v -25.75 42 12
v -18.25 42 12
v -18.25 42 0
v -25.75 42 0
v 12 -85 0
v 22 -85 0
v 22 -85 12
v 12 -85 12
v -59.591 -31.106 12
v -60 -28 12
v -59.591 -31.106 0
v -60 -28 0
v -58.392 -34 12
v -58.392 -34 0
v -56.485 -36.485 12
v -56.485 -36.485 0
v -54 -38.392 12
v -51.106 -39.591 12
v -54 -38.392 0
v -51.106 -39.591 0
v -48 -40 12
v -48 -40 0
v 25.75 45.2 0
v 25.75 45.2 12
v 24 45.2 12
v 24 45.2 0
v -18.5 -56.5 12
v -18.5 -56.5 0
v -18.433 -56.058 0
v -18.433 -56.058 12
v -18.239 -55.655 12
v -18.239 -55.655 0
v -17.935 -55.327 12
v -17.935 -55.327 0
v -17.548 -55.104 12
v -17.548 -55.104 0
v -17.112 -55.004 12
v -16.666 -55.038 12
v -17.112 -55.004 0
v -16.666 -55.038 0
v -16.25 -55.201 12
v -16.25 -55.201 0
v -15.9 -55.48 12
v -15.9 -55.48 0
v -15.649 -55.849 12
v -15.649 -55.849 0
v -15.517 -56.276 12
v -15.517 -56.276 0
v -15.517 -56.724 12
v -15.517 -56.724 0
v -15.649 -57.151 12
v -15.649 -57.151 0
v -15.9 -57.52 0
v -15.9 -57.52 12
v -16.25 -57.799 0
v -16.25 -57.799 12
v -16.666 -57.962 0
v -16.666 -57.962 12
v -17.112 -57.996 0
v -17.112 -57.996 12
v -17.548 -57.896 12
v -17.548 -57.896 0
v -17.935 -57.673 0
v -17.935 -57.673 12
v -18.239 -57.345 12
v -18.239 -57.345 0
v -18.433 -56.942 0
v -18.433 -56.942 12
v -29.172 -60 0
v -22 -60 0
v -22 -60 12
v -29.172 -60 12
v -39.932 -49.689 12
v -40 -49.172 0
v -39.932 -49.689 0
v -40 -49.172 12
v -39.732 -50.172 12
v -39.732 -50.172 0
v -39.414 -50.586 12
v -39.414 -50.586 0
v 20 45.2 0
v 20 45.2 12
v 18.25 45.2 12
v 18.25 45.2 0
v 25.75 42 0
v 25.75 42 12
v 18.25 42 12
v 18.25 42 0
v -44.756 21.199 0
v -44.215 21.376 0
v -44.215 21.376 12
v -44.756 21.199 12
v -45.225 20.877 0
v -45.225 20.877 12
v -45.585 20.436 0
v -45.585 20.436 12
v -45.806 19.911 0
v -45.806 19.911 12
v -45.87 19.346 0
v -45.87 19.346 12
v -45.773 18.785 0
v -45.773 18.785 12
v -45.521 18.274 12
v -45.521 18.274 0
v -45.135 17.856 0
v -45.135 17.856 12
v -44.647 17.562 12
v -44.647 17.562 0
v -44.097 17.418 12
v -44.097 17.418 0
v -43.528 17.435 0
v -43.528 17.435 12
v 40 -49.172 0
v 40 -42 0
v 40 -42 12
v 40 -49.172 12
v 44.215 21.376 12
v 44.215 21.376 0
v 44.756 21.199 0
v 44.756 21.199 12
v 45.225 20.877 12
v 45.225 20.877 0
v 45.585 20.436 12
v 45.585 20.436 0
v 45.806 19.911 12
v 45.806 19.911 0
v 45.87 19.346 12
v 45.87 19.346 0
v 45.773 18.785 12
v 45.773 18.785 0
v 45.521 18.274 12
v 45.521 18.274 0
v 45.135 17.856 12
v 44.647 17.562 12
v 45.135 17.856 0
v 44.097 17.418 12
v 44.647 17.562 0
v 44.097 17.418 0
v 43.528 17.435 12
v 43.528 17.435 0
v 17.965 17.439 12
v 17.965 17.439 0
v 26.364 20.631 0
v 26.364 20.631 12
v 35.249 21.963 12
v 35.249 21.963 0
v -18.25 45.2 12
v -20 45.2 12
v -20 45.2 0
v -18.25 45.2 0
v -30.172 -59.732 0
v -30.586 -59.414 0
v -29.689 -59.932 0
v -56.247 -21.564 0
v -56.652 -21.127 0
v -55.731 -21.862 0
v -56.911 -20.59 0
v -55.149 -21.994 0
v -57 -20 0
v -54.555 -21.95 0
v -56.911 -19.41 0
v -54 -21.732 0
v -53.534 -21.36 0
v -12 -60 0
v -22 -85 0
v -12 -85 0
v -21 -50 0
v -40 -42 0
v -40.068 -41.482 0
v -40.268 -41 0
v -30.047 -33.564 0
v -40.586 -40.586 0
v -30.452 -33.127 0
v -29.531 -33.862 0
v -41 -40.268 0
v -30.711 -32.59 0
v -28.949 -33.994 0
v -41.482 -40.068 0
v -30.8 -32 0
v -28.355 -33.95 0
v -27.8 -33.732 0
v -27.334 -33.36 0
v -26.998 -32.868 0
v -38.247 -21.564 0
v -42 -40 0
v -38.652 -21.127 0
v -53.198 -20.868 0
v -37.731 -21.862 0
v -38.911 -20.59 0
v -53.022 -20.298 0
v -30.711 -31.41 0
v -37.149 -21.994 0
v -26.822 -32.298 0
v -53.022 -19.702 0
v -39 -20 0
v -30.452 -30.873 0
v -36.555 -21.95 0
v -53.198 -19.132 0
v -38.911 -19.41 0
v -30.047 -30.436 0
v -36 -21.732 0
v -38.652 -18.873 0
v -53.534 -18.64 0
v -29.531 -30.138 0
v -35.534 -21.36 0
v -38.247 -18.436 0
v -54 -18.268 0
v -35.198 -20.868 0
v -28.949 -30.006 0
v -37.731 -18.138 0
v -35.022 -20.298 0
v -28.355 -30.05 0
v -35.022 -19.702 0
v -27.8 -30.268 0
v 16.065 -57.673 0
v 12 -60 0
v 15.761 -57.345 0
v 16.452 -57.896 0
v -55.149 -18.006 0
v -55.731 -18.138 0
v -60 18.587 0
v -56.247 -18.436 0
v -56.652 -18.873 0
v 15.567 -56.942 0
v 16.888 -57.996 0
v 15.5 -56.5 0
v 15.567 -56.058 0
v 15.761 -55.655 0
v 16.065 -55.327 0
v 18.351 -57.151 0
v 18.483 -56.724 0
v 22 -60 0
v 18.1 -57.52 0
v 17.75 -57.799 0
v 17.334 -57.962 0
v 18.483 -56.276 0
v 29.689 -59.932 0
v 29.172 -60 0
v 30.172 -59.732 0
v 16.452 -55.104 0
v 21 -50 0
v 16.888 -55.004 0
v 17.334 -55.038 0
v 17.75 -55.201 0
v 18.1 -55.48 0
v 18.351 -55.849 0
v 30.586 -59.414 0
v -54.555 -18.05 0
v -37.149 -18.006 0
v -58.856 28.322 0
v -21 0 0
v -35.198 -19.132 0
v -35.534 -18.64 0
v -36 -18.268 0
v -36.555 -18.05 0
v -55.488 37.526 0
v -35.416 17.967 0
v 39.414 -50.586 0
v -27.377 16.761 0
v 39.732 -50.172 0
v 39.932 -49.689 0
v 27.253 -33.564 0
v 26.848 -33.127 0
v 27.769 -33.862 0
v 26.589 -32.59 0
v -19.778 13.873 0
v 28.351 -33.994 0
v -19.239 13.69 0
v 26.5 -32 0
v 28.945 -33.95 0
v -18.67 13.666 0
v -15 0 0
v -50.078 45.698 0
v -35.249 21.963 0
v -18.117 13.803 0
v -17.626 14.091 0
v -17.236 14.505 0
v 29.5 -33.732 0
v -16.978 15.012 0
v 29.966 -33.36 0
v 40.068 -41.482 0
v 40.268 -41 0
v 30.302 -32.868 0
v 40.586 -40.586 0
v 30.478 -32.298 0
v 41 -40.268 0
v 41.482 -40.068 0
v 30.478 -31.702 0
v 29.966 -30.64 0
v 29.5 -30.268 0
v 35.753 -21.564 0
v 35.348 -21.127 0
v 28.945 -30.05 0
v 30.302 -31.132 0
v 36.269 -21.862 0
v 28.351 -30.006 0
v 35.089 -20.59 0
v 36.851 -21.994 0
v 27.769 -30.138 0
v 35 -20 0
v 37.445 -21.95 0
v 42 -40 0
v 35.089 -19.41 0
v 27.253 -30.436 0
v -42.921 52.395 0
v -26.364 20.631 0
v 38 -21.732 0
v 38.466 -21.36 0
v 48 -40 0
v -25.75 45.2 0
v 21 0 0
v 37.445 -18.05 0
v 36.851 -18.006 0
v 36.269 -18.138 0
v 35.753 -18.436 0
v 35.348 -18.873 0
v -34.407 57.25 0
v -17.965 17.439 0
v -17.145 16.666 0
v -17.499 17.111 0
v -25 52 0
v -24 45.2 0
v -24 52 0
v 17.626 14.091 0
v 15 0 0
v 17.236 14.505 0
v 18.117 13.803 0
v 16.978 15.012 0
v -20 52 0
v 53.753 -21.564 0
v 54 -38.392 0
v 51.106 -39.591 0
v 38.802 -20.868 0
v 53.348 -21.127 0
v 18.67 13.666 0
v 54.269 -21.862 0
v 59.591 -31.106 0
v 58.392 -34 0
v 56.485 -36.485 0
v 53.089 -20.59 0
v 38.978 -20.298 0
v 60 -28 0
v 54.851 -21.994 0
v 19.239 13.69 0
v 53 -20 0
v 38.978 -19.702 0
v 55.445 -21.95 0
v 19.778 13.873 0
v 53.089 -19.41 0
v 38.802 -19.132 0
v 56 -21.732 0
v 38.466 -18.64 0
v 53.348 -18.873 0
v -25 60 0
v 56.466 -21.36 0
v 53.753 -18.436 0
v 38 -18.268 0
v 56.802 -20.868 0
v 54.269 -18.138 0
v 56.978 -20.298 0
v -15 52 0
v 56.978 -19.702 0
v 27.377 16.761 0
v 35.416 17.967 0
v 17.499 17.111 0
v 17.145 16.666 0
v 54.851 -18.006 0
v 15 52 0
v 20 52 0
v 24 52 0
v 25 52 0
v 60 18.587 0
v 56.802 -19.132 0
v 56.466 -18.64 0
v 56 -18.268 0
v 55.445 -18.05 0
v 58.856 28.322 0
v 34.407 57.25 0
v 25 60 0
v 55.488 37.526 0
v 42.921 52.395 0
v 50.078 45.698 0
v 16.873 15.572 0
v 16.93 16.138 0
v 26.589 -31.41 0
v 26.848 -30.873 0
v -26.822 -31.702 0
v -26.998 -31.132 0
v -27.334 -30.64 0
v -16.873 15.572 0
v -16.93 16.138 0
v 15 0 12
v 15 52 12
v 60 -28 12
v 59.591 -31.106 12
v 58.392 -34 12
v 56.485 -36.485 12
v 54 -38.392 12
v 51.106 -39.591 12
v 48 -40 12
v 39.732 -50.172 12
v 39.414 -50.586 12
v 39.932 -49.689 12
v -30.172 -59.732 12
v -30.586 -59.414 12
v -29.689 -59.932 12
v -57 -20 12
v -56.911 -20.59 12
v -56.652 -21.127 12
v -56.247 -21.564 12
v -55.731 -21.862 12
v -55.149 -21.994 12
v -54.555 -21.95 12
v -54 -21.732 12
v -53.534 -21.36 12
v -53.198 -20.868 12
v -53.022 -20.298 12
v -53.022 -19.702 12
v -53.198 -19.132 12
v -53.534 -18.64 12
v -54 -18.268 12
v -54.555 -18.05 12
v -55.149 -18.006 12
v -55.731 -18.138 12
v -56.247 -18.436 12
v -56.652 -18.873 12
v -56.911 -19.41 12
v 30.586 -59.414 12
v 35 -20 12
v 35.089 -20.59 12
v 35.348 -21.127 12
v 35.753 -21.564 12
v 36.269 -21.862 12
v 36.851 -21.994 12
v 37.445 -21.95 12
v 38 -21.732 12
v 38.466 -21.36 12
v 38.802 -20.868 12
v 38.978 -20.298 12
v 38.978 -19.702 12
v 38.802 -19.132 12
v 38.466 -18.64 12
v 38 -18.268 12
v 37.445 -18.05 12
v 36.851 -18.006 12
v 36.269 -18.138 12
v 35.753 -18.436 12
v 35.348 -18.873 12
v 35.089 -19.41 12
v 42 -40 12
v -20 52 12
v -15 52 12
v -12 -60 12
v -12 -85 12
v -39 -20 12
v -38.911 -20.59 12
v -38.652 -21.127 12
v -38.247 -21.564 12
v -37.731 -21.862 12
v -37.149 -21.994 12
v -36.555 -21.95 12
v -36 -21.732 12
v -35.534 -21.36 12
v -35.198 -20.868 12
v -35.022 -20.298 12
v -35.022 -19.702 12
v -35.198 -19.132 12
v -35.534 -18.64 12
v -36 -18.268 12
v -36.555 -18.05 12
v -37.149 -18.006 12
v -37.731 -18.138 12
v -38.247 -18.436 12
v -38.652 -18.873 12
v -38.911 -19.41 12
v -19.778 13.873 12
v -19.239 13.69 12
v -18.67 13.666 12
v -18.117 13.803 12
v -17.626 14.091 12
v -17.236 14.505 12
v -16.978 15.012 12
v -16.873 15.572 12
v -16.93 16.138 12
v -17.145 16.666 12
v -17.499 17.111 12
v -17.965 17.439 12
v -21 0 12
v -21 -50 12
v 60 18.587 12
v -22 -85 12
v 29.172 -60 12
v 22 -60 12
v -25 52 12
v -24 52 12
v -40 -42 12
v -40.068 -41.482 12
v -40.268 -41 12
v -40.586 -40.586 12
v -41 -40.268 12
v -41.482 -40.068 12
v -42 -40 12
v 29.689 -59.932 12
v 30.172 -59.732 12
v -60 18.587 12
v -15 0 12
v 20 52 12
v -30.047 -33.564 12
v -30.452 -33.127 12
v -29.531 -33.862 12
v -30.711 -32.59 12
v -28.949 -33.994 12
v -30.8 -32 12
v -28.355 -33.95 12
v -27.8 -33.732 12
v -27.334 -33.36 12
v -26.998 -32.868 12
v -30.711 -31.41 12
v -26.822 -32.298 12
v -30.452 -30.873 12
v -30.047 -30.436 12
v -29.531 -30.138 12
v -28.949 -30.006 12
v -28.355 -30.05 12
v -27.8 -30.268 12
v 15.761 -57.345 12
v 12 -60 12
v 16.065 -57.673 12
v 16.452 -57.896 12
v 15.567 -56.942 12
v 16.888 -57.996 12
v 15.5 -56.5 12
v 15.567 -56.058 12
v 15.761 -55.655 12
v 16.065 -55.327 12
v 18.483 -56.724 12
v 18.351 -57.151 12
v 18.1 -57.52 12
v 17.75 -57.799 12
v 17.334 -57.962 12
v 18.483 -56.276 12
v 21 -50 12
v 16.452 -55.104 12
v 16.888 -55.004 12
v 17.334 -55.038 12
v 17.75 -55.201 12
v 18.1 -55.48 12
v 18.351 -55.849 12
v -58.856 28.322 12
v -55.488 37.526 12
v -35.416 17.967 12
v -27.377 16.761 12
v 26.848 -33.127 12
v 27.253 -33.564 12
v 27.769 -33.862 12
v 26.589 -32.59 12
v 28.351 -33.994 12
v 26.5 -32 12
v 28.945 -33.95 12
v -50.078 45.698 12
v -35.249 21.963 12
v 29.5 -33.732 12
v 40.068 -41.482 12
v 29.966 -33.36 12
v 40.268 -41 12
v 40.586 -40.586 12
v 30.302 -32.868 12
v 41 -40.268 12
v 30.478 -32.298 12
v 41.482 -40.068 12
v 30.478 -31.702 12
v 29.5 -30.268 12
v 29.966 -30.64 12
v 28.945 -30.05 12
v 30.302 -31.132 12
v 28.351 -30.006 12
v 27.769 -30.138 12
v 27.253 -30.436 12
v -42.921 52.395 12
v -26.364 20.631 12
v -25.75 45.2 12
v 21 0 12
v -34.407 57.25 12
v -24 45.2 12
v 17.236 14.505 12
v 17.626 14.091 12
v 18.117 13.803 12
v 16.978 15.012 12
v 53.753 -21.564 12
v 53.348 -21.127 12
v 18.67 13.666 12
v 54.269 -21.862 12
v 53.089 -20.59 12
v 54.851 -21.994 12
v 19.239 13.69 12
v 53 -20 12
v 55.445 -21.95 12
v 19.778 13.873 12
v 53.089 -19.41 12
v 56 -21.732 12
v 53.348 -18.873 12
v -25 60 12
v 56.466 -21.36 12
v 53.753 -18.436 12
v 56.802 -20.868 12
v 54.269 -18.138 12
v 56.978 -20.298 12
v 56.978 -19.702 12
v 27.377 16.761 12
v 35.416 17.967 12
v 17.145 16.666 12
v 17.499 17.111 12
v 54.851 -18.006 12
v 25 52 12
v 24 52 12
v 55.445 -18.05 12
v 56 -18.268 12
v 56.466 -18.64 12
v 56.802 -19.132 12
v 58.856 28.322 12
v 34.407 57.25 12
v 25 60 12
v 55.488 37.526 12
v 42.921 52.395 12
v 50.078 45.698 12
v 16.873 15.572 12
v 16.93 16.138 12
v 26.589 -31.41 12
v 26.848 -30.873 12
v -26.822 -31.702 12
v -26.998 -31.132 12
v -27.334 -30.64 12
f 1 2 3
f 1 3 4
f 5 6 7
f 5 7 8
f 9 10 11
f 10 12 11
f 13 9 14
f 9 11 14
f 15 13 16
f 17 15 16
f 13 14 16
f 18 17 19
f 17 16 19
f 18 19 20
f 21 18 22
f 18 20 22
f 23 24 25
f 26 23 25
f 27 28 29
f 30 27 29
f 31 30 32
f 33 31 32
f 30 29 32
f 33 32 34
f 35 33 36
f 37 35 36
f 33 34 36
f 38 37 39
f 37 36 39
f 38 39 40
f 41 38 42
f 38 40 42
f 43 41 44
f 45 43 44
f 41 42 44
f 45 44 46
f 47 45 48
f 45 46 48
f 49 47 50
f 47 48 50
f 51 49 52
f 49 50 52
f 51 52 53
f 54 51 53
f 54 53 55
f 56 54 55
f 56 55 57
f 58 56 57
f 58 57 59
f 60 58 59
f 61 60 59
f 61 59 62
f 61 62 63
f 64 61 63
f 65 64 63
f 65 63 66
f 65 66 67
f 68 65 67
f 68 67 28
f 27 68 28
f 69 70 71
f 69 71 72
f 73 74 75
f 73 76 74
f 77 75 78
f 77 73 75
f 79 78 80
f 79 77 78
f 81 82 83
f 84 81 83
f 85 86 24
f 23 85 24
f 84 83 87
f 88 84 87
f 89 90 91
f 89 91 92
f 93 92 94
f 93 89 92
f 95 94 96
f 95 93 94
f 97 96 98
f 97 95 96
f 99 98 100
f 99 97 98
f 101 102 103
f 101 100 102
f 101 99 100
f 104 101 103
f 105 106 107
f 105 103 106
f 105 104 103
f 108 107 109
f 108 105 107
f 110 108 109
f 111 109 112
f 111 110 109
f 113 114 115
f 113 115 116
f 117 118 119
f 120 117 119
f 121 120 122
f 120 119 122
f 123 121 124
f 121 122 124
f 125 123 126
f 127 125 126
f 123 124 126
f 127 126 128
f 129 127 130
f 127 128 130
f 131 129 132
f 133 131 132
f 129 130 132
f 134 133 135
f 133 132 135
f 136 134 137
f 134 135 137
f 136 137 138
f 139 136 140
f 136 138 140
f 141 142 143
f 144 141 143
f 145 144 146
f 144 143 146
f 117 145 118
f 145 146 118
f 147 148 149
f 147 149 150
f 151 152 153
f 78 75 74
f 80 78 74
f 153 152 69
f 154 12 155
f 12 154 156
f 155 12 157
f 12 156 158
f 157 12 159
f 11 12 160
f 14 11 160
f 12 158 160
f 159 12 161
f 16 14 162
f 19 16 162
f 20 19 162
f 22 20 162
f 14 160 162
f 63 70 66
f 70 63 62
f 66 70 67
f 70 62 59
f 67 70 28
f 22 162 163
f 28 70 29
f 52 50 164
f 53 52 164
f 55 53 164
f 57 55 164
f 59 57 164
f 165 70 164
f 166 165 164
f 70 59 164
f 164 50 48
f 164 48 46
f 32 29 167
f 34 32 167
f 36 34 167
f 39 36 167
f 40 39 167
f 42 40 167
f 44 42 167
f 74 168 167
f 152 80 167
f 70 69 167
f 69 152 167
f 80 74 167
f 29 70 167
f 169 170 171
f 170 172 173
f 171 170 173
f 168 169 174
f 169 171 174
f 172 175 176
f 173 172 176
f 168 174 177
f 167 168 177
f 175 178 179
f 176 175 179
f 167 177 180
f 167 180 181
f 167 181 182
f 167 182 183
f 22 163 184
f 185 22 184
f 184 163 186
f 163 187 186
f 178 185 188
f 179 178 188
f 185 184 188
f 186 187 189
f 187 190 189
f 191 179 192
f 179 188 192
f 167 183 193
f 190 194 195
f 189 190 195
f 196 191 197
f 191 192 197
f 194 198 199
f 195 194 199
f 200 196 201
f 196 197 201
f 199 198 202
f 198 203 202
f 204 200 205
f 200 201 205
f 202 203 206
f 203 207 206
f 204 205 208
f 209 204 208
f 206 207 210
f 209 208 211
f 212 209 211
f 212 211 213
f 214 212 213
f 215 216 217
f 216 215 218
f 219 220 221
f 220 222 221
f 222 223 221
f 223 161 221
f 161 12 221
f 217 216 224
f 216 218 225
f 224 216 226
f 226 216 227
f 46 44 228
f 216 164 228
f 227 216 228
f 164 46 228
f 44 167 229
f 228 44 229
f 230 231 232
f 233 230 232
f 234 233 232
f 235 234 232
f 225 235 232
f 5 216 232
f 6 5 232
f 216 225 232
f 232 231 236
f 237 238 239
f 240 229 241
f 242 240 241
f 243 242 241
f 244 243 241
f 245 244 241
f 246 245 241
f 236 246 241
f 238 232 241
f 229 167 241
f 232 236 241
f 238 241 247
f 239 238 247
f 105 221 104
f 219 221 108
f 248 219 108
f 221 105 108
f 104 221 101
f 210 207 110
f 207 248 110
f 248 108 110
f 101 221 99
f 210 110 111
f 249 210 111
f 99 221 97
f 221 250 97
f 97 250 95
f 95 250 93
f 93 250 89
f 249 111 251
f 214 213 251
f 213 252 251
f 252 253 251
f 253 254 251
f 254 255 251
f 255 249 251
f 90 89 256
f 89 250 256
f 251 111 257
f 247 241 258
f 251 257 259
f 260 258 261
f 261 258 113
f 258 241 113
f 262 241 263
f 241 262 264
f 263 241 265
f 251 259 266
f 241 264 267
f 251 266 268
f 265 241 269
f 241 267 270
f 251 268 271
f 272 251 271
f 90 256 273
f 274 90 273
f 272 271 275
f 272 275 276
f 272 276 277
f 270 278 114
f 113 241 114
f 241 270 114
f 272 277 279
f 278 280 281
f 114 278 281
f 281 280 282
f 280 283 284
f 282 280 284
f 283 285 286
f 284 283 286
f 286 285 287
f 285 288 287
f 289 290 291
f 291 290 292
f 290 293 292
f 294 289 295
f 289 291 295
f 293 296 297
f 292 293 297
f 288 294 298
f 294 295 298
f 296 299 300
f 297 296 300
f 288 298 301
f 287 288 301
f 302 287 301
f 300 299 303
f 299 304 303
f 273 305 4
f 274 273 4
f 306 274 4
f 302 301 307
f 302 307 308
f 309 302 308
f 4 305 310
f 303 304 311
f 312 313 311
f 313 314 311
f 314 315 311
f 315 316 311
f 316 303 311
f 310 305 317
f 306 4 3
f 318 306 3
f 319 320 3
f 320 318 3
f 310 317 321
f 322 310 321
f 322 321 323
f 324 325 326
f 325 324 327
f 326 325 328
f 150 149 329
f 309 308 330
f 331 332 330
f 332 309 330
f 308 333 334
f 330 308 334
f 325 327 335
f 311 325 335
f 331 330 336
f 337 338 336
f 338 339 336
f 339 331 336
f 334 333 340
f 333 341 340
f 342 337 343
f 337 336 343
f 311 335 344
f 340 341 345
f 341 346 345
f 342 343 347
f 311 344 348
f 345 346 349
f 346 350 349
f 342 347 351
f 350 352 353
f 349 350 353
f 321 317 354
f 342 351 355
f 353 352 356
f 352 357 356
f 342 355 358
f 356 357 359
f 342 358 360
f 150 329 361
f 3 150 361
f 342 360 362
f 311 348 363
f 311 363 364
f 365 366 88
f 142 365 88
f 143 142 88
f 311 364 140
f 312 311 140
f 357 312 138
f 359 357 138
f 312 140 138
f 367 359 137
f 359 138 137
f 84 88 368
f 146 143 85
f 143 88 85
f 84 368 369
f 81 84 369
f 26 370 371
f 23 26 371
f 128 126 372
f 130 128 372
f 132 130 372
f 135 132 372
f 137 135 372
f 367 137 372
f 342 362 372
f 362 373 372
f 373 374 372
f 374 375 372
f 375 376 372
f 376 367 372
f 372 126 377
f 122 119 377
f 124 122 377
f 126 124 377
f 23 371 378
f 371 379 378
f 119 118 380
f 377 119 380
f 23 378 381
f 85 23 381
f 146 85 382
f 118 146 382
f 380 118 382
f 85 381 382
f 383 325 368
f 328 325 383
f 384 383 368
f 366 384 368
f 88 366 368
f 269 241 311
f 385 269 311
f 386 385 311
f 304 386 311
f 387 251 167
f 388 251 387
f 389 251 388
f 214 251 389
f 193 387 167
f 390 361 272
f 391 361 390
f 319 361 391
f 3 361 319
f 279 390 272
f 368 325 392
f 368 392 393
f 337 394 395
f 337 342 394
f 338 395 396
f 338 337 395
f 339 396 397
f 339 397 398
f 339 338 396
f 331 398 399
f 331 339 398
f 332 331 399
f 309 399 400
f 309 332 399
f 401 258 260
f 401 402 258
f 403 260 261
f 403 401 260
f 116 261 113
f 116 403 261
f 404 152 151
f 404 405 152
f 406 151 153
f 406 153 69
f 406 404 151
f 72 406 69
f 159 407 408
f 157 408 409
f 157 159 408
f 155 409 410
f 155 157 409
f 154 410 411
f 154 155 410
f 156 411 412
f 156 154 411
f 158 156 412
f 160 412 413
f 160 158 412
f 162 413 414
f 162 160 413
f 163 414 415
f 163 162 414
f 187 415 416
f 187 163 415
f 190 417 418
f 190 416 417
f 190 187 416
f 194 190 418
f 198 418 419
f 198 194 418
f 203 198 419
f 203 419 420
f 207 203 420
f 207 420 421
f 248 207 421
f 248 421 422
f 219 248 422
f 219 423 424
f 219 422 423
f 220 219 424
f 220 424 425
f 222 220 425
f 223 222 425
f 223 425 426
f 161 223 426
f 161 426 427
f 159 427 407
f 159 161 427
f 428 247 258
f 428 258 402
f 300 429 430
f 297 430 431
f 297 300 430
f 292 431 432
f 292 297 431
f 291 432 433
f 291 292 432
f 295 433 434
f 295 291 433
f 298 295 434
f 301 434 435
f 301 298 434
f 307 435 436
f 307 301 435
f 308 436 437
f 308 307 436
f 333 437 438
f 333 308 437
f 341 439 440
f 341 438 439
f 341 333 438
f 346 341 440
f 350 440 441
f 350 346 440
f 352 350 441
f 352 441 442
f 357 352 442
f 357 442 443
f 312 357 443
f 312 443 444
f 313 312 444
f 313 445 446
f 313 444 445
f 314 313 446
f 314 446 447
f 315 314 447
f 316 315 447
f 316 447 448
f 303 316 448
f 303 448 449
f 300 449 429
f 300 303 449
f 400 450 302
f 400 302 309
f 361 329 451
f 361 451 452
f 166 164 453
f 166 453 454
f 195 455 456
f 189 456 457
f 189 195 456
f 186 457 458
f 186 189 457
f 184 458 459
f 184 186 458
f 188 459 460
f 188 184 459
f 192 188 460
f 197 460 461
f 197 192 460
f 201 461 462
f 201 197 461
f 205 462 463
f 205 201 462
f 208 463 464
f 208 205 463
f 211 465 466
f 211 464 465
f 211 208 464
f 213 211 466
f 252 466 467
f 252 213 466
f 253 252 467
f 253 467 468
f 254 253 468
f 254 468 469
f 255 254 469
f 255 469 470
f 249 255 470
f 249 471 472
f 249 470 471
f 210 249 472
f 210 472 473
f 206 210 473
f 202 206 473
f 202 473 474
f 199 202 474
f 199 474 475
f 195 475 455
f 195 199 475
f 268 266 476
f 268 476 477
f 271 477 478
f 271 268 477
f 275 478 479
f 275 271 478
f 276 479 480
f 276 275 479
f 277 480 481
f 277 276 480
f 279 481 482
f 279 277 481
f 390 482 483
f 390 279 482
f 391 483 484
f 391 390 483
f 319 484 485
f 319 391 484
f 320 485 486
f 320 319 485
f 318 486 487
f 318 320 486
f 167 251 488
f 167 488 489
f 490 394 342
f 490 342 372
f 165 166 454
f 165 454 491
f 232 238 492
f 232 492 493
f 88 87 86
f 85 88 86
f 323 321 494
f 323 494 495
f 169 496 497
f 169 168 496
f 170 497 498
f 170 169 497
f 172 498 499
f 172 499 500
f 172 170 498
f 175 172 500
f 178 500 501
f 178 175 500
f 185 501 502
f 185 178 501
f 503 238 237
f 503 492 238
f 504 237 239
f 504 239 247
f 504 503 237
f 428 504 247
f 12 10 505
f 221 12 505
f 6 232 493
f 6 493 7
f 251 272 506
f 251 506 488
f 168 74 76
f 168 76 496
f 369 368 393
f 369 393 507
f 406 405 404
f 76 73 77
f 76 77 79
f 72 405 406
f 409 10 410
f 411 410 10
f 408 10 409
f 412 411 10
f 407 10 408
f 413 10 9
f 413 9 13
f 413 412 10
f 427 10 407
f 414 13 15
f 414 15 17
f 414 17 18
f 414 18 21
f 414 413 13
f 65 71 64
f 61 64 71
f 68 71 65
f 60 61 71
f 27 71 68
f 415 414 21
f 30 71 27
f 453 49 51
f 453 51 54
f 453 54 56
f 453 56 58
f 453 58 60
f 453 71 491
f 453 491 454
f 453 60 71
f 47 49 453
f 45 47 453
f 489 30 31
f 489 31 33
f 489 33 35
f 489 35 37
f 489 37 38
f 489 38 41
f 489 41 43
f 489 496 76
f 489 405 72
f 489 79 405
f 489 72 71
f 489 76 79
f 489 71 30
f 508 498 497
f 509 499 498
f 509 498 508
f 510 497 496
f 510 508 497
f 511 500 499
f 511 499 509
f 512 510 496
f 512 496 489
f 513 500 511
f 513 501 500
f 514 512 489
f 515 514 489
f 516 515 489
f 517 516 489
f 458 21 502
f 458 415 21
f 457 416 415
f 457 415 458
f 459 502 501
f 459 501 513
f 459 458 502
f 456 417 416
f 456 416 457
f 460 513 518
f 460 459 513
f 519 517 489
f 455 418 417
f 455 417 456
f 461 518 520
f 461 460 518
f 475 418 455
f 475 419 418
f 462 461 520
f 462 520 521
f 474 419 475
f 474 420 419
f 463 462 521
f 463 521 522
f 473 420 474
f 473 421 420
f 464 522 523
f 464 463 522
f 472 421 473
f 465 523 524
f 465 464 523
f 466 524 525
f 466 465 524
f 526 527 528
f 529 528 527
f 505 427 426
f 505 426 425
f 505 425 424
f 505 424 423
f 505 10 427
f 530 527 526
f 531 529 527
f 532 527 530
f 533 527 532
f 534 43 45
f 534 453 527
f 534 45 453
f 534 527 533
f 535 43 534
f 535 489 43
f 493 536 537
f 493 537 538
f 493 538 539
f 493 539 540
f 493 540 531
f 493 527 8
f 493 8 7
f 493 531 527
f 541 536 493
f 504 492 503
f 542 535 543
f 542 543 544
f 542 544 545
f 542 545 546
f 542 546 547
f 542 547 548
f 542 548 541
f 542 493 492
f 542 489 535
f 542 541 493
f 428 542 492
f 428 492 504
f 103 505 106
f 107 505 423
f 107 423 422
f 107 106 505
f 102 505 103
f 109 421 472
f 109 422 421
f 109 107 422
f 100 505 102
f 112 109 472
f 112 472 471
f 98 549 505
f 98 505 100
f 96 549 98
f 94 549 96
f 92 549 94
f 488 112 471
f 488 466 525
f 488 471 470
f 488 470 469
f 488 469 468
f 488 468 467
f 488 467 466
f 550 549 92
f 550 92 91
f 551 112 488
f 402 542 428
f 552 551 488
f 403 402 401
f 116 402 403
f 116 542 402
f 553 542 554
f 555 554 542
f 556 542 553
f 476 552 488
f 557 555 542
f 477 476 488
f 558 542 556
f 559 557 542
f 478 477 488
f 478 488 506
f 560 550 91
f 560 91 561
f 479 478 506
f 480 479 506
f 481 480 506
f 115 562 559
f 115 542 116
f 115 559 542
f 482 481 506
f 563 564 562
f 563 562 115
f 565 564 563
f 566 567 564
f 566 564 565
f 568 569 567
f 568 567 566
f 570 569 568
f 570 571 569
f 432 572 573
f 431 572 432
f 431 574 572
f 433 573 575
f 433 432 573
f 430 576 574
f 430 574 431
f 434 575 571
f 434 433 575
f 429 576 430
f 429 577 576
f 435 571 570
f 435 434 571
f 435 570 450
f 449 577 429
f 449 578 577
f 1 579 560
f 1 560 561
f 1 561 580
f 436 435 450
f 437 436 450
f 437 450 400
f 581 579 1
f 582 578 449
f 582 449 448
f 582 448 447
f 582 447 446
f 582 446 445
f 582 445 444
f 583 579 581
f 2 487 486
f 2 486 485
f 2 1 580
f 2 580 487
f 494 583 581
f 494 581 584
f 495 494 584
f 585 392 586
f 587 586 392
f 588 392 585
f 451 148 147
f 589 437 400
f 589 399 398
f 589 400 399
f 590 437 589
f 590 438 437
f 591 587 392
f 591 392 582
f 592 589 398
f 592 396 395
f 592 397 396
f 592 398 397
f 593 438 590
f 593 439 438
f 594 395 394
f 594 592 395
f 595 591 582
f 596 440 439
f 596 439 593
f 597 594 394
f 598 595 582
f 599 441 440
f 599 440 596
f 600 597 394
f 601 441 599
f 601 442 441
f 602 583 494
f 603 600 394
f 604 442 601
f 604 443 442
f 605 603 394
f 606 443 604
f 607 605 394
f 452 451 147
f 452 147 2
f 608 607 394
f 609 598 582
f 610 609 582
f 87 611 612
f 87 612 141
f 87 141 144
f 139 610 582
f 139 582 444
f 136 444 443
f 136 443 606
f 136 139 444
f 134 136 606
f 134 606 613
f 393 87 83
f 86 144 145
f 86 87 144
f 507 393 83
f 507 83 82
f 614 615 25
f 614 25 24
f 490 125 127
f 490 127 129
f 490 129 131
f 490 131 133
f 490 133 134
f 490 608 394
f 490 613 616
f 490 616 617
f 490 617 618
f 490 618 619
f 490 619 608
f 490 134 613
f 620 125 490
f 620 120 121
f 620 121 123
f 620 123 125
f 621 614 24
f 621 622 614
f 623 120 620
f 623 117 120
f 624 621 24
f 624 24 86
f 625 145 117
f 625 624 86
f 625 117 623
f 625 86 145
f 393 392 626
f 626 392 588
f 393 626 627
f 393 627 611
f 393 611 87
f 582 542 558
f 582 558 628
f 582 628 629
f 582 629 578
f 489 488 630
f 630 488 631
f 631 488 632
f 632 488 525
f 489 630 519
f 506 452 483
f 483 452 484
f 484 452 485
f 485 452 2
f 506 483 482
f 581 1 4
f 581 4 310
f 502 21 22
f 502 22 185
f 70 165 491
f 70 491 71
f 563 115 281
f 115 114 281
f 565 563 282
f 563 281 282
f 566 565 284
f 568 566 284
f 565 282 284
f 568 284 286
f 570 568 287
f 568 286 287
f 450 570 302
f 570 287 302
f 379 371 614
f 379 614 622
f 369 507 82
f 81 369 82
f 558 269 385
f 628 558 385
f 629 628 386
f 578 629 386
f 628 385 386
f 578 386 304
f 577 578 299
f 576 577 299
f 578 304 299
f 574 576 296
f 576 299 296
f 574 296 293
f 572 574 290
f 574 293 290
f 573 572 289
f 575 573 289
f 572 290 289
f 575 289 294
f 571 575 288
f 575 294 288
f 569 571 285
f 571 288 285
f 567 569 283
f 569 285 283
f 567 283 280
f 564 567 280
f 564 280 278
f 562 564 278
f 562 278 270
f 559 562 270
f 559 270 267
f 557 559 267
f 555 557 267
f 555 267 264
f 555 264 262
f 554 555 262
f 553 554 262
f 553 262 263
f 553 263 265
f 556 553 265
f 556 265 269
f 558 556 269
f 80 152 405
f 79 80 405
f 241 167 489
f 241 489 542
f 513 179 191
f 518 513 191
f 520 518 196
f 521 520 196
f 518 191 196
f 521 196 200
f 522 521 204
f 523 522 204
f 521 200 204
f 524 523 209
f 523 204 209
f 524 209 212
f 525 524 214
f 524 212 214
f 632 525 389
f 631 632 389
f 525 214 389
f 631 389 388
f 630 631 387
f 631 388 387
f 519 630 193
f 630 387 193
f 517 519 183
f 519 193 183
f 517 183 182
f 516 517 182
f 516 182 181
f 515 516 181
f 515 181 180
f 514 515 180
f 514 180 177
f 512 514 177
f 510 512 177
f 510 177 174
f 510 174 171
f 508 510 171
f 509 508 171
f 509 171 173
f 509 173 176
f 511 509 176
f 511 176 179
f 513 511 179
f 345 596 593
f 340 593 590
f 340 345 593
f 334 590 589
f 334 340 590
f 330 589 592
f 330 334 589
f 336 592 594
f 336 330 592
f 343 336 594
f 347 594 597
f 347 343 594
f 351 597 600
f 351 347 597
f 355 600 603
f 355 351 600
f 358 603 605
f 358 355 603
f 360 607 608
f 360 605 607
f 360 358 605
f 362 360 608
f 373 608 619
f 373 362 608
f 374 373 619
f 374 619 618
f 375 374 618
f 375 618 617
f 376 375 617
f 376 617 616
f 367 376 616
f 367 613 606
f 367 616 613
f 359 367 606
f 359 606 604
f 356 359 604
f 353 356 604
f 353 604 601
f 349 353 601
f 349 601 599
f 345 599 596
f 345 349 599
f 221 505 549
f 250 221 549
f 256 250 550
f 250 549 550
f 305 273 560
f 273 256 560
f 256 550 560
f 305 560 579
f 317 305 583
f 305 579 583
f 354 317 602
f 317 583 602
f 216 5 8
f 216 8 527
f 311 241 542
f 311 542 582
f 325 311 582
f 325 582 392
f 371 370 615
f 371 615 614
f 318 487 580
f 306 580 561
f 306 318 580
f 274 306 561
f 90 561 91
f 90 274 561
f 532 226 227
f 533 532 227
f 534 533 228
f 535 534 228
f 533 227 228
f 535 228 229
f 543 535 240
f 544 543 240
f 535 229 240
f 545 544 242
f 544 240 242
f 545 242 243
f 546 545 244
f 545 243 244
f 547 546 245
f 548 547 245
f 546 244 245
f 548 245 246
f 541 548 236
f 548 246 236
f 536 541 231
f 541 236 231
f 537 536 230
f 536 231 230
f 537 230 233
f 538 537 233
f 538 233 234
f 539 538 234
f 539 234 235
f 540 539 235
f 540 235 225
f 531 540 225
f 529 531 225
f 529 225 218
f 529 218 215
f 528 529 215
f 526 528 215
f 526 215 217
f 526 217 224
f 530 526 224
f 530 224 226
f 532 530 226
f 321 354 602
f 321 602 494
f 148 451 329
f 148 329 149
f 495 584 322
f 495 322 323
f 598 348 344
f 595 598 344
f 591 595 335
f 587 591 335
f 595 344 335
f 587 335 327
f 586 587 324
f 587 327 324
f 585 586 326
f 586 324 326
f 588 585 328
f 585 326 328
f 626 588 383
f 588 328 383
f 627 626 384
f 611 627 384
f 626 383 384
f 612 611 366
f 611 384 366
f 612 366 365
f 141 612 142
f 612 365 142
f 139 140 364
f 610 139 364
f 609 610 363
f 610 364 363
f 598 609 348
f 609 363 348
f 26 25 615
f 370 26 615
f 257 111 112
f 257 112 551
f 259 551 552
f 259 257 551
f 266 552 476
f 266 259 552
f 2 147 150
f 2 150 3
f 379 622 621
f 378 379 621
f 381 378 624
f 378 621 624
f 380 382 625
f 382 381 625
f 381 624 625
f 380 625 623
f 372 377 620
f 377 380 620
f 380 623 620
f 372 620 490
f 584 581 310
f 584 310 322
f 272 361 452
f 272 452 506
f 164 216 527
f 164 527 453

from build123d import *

# Parameters (mm, degrees)
BOSS_EXTRUDE1_DEPTH = 12
SKETCH2_R           = 2
SKETCH2_R_2         = 1.5
CUT_EXTRUDE1_DEPTH  = 95.704804524
SKETCH4_W           = 20
SKETCH4_H           = 100
BOSS_EXTRUDE2_DEPTH = 12
FILLET3_R           = 42
FILLET4_R           = 12
SKETCH7_R           = 2
CUT_EXTRUDE3_DEPTH  = 105.732993846
CHAMFER1_SIZE       = 10
FILLET8_R           = 2
CUT_EXTRUDE4_DEPTH  = 105.732993846
CUT_EXTRUDE5_DEPTH  = 105.732993846


with BuildPart() as part:
    # Sketch1 → Boss-Extrude1 (new body)
    with BuildSketch(Plane.XY):
        Polygon((-40, 60), (-25, 60), (-25, 52), (-15, 52), (-15, 0), (-21, 0), (-21, -50), (21, -50), (21, 0), (15, 0), (15, 52), (25, 52), (25, 60), (40, 60), (40, -60), (22, -60), (22, -85), (12, -85), (12, -60), (-12, -60), (-12, -85), (-22, -85), (-22, -60), (-40, -60), align=None)
    extrude(amount=BOSS_EXTRUDE1_DEPTH)

    # Sketch2 → Cut-Extrude1 (cut, through all)
    with BuildSketch(Plane(origin=(0, 0, 0), x_dir=(-1, 0, 0), z_dir=(0, 0, -1))):
        with Locations((-28.5, -32)):
            Circle(SKETCH2_R)
        with Locations((17, -56.5)):
            Circle(SKETCH2_R_2)
        with Locations((28.8, -32)):
            Circle(SKETCH2_R)
        with Locations((-17, -56.5)):
            Circle(SKETCH2_R_2)
    extrude(amount=-CUT_EXTRUDE1_DEPTH, mode=Mode.SUBTRACT)

    # Sketch4 → Boss-Extrude2 (add)
    with BuildSketch(Plane.XY.offset(12)):
        with Locations((-50, 10)):
            Rectangle(SKETCH4_W, SKETCH4_H)
        with Locations((50, 10)):
            Rectangle(SKETCH4_W, SKETCH4_H)
    extrude(amount=-BOSS_EXTRUDE2_DEPTH)

    # Fillet3
    # the kernel refuses this fillet: 42 mm, written as the material it takes off along each edge
    with BuildSketch(Plane(origin=(60, 60, 115.531396204), x_dir=(0, -1, 0), z_dir=(0, 0, -1))) as fillet3_piece_1:
        with BuildLine():
            CenterArc((41.412558482, 42), FILLET3_R, 189.594068227, 80.405931773)
            Line((0, 35), (-0.82825117, 34.86))
            ThreePointArc((-0.82825117, 34.86), (-0.84, 17.5), (-0.84, 0))
            Line((-0.84, 0), (0, -0.84))
            Line((0, -0.84), (41.412558482, -0.84))
            Line((41.412558482, -0.84), (41.412558482, 0))
        make_face()
    extrude(amount=219.062792409, mode=Mode.SUBTRACT)
    with BuildSketch(Plane(origin=(-60, 60, 115.531396204), x_dir=(1, 0, 0), z_dir=(0, 0, -1))) as fillet3_piece_2:
        with BuildLine():
            CenterArc((42, 41.412558482), FILLET3_R, 180, 80.405931773)
            Line((0, 41.412558482), (-0.84, 41.412558482))
            Line((-0.84, 41.412558482), (-0.84, 0))
            Line((-0.84, 0), (0, -0.84))
            ThreePointArc((0, -0.84), (17.5, -0.84), (34.86, -0.82825117))
            Line((34.86, -0.82825117), (35, 0))
        make_face()
    extrude(amount=219.062792409, mode=Mode.SUBTRACT)

    # Fillet4
    fillet4_edges = [part.edges().sort_by_distance(p)[0] for p in [
        (60, -40, 6),
        (-60, -40, 6),
    ]]
    fillet(fillet4_edges, radius=FILLET4_R)

    # Sketch7 → Cut-Extrude3 (cut, through all)
    with BuildSketch(Plane.XY):
        with Locations(Location((-55, -20, 0), (0, 0, 180))):
            Circle(SKETCH7_R)
        with Locations(Location((55, -20, 0), (0, 0, 180))):
            Circle(SKETCH7_R)
        with Locations(Location((-37, -20, 0), (0, 0, 180))):
            Circle(SKETCH7_R)
        with Locations(Location((37, -20, 0), (0, 0, 180))):
            Circle(SKETCH7_R)
    extrude(amount=CUT_EXTRUDE3_DEPTH, mode=Mode.SUBTRACT)

    # Chamfer1
    chamfer1_edges = [part.edges().sort_by_distance(p)[0] for p in [
        (-40, -60, 6),
        (40, -60, 6),
    ]]
    chamfer(chamfer1_edges, length=CHAMFER1_SIZE)

    # Fillet8
    fillet8_edges = [part.edges().sort_by_distance(p)[0] for p in [
        (-30, -60, 6),
        (-40, -50, 6),
        (30, -60, 6),
        (40, -50, 6),
        (40, -40, 6),
        (-40, -40, 6),
    ]]
    fillet(fillet8_edges, radius=FILLET8_R)

    # Sketch8 → Cut-Extrude4 (cut, through all)
    with BuildSketch(Plane(origin=(0, 0, 0), x_dir=(-1, 0, 0), z_dir=(0, 0, -1))):
        with BuildLine():
            ThreePointArc((-17.964817996, 17.438774634), (-30.770630407, 21.535466224), (-44.214817996, 21.375674028))
            ThreePointArc((-44.214817996, 21.375674028), (-45.841525426, 19.061841075), (-43.527692473, 17.435133644))
            ThreePointArc((-43.527692473, 17.435133644), (-31.363903701, 17.579707536), (-19.777692473, 13.87317705))
            ThreePointArc((-19.777692473, 13.87317705), (-17.088456442, 14.749538603), (-17.964817996, 17.438774634))
        make_face()
        with BuildLine():
            ThreePointArc((17.964817996, 17.438774634), (30.770630407, 21.535466224), (44.214817996, 21.375674028))
            ThreePointArc((44.214817996, 21.375674028), (45.841525426, 19.061841075), (43.527692473, 17.435133644))
            ThreePointArc((43.527692473, 17.435133644), (31.363903701, 17.579707536), (19.777692473, 13.87317705))
            ThreePointArc((19.777692473, 13.87317705), (17.088456442, 14.749538603), (17.964817996, 17.438774634))
        make_face()
    extrude(amount=-CUT_EXTRUDE4_DEPTH, mode=Mode.SUBTRACT)

    # Sketch9 → Cut-Extrude5 (cut, through all)
    with BuildSketch(Plane.XY.offset(12)):
        Polygon((-24, 52), (-20, 52), (-20, 45.2), (-18.25, 45.2), (-18.25, 42), (-25.75, 42), (-25.75, 45.2), (-24, 45.2), align=None)
    cut_extrude5 = extrude(amount=-CUT_EXTRUDE5_DEPTH, mode=Mode.SUBTRACT)

    # Mirror1: Cut-Extrude5 across plane
    add(cut_extrude5.mirror(Plane(origin=(0, 0, 0), x_dir=(0, 0, 1), z_dir=(1, 0, 0))), mode=Mode.SUBTRACT)


solid = part.part
